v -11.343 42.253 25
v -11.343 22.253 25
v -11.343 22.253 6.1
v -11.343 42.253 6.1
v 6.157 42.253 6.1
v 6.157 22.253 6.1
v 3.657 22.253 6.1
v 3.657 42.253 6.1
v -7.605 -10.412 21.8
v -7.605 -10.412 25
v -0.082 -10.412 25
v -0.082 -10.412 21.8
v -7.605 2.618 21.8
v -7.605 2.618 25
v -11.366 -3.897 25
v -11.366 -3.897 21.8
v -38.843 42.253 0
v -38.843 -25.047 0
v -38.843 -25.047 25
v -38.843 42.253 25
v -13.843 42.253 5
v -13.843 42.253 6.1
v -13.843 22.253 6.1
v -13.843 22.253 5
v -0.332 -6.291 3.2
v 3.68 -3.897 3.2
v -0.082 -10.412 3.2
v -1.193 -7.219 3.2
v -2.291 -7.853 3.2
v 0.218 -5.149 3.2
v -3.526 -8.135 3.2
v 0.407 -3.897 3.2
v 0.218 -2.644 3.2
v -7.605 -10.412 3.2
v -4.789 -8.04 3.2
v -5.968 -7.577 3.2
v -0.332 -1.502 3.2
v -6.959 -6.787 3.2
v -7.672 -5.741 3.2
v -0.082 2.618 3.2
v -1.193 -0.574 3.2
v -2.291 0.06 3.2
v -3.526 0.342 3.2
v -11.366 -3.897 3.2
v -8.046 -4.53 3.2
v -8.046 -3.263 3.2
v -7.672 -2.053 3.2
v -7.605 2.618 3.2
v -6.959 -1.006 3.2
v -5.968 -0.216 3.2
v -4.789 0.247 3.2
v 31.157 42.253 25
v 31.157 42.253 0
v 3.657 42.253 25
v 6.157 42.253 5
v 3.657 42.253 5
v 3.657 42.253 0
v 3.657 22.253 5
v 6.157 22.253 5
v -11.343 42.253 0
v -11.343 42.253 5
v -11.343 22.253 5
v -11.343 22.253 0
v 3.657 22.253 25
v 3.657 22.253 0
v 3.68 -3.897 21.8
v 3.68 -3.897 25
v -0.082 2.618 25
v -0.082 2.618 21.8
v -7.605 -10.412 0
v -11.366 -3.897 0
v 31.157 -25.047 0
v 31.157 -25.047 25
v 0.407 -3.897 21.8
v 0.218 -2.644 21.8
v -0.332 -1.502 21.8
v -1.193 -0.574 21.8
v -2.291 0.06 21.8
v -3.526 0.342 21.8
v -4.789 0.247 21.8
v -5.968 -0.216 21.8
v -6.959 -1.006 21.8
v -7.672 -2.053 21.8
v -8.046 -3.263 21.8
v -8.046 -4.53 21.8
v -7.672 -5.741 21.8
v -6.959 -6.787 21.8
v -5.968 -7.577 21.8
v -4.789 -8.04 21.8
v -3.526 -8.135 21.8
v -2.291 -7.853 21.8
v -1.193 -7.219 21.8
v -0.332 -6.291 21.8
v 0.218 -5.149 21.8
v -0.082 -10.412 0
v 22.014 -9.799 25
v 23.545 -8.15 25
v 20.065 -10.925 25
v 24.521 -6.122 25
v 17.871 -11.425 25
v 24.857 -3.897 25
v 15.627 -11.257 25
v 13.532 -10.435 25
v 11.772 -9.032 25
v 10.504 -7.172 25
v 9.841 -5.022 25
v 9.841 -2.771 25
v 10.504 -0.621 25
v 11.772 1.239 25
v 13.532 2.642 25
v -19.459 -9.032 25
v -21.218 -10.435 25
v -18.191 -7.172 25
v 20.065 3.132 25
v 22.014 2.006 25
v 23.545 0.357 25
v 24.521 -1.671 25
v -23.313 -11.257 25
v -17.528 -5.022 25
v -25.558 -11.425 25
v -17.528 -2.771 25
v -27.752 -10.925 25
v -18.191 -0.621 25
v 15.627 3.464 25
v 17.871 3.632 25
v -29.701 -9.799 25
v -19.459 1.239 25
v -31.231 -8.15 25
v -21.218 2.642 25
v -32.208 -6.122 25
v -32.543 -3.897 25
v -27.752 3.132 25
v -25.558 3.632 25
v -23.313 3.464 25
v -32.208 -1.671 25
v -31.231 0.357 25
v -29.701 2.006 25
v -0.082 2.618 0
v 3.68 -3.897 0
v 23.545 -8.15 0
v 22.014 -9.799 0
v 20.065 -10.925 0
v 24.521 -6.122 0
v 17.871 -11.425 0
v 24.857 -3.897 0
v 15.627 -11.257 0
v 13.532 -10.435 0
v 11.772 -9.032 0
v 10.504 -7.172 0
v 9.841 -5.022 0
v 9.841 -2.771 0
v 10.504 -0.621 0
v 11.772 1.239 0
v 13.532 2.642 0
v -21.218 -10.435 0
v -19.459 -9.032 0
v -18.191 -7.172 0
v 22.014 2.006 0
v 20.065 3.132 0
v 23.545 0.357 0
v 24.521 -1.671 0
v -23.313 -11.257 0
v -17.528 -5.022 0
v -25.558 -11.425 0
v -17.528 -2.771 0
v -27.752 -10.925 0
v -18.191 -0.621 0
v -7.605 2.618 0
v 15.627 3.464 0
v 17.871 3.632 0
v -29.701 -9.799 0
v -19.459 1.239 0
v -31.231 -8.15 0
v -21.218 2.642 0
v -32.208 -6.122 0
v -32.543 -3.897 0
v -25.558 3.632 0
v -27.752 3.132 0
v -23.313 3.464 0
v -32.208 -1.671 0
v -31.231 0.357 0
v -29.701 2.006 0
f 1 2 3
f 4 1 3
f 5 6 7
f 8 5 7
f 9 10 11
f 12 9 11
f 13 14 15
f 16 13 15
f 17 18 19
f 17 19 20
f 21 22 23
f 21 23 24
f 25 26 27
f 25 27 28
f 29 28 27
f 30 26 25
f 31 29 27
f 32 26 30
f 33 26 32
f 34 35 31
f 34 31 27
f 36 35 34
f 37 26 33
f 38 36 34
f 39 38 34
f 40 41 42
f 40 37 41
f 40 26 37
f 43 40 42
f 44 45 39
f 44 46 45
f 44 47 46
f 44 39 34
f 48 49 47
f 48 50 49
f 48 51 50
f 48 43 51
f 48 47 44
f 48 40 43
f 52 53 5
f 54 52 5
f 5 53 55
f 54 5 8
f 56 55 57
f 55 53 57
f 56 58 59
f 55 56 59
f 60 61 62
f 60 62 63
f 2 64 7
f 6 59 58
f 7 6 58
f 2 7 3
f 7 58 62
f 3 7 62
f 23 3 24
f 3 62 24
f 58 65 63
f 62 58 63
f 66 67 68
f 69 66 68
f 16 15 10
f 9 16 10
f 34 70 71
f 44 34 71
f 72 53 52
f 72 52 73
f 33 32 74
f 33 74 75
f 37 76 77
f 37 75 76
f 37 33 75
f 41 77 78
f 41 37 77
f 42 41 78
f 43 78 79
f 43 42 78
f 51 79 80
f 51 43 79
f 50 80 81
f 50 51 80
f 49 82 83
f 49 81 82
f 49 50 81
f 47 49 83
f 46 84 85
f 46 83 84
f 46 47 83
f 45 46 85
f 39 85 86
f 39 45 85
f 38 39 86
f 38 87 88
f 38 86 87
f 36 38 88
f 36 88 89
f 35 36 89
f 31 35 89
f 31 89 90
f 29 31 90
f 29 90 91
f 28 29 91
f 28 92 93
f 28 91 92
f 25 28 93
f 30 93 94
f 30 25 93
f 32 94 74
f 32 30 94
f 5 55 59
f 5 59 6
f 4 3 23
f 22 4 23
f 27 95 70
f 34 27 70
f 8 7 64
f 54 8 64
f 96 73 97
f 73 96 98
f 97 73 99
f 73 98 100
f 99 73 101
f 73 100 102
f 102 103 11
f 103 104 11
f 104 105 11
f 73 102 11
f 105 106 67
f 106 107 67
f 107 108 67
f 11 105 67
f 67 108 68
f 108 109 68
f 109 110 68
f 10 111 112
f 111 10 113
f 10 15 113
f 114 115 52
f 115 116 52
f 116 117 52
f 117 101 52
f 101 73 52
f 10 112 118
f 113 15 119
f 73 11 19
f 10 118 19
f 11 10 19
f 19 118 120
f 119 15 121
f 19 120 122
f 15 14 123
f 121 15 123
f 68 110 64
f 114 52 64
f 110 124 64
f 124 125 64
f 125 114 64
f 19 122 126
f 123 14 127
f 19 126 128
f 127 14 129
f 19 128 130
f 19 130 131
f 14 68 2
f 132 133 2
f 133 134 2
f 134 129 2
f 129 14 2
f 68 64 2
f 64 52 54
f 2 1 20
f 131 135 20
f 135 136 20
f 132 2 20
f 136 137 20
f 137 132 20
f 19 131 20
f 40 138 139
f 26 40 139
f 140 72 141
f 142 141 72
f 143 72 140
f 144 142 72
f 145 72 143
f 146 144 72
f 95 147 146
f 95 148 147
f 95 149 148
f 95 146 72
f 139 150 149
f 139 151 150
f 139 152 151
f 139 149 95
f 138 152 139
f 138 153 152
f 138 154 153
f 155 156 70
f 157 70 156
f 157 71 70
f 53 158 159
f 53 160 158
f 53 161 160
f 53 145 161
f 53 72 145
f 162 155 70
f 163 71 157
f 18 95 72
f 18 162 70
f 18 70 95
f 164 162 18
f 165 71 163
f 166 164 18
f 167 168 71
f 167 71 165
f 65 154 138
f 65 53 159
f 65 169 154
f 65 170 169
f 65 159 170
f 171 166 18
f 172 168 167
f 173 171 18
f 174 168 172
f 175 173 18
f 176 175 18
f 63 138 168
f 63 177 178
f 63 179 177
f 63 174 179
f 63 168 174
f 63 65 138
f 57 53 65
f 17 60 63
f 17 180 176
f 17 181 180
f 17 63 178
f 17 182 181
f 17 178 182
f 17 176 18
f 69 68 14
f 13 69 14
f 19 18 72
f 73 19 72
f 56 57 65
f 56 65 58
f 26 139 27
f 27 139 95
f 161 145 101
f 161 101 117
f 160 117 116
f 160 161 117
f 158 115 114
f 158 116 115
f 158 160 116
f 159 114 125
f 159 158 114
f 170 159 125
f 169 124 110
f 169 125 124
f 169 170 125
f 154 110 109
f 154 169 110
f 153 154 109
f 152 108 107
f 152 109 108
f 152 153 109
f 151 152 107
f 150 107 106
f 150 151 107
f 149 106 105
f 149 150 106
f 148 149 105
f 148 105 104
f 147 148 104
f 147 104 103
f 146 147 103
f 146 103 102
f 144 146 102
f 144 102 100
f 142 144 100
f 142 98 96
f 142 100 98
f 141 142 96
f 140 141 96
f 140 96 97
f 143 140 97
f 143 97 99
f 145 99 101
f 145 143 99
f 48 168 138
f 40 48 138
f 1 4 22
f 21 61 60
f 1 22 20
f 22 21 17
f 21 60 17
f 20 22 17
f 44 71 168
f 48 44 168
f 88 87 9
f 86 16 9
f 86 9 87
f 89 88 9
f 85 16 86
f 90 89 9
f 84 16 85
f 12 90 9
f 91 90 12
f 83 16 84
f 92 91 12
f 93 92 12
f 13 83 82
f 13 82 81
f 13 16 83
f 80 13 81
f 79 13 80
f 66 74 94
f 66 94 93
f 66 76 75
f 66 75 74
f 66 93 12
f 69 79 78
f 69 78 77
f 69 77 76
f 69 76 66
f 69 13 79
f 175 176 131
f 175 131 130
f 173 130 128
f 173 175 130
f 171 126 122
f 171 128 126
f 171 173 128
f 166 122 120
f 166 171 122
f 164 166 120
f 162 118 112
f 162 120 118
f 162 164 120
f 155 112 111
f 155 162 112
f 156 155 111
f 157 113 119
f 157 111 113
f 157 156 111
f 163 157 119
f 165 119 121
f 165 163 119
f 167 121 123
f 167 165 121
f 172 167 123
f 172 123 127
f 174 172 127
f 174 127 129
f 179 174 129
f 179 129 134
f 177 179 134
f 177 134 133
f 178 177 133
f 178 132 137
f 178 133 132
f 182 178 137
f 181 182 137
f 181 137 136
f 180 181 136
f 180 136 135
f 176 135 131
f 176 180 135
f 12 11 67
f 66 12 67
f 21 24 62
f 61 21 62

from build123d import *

# Parameters (mm, degrees)
BOSS_EXTRUDE1_DEPTH     = 25
CUT_EXTRUDE1_DEPTH      = 3.2
CUT_EXTRUDE2_DEPTH      = 3.2
CUT_EXTRUDE3_DEPTH      = 62.39542258
CUT_EXTRUDE3_DEPTH_BACK = 62.39542258
SKETCH4_R               = 4.25
CUT_EXTRUDE4_DEPTH      = 63.603178144
CUT_EXTRUDE4_DEPTH_BACK = 63.603178144
SKETCH5_R               = 7.55
CUT_EXTRUDE5_DEPTH      = 20


with BuildPart() as part:
    # Sketch1 → Boss-Extrude1 (new body)
    with BuildSketch(Plane.XY):
        Polygon((-3.843317972, 42.253456221), (31.156682028, 42.253456221), (31.156682028, -25.046543779), (-4.705317324, -25.046543779), (-38.843317972, -25.046543779), (-38.843317972, 42.253456221), align=None)
    extrude(amount=BOSS_EXTRUDE1_DEPTH)

    # Sketch2 → Cut-Extrude1 (cut)
    with BuildSketch(Plane.XY.offset(25)):
        Polygon((3.679556035, -3.896543779), (-0.081880969, 2.618456221), (-7.604754976, 2.618456221), (-11.36619198, -3.896543779), (-7.604754976, -10.411543779), (-0.081880969, -10.411543779), align=None)
    extrude(amount=-CUT_EXTRUDE1_DEPTH, mode=Mode.SUBTRACT)

    # Sketch3 → Cut-Extrude2 (cut)
    with BuildSketch(Plane(origin=(0, 0, 0), x_dir=(-1, 0, 0), z_dir=(0, 0, -1))):
        Polygon((11.36619198, -3.896543779), (7.604754976, 2.618456221), (0.081880969, 2.618456221), (-3.679556035, -3.896543779), (0.081880969, -10.411543779), (7.604754976, -10.411543779), align=None)
    extrude(amount=-CUT_EXTRUDE2_DEPTH, mode=Mode.SUBTRACT)

    # Sketch4 → Cut-Extrude3 (cut, two sides: drawn at the far end of the back side and taken through both)
    with BuildSketch(Plane.XY.offset(21.8).offset(-CUT_EXTRUDE3_DEPTH_BACK)):
        with Locations((-3.843317972, -3.896543779)):
            Circle(SKETCH4_R)
    extrude(amount=CUT_EXTRUDE3_DEPTH + CUT_EXTRUDE3_DEPTH_BACK, mode=Mode.SUBTRACT)

    # Sketch5 → Cut-Extrude4 (cut, two sides: drawn at the far end of the back side and taken through both)
    with BuildSketch(Plane.XY.offset(25).offset(-CUT_EXTRUDE4_DEPTH_BACK)):
        with Locations((17.306682028, -3.896543779)):
            Circle(SKETCH5_R)
        with Locations(Location((-24.993317972, -3.896543779, 0), (0, 0, 180))):
            Circle(SKETCH5_R)
    extrude(amount=CUT_EXTRUDE4_DEPTH + CUT_EXTRUDE4_DEPTH_BACK, mode=Mode.SUBTRACT)

    # Sketch6 → Cut-Extrude5 (cut)
    with BuildSketch(Plane(origin=(0, 42.253456221, 0), x_dir=(1, 0, 0), z_dir=(0, 1, 0))):
        Polygon((-3.843317972, 0), (3.656682028, 0), (3.656682028, -5), (6.156682028, -5), (6.156682028, -6.1), (3.656682028, -6.1), (3.656682028, -25), (-11.343317972, -25), (-11.343317972, -6.1), (-13.843317972, -6.1), (-13.843317972, -5), (-11.343317972, -5), (-11.343317972, 0), align=None)
    extrude(amount=-CUT_EXTRUDE5_DEPTH, mode=Mode.SUBTRACT)


solid = part.part
